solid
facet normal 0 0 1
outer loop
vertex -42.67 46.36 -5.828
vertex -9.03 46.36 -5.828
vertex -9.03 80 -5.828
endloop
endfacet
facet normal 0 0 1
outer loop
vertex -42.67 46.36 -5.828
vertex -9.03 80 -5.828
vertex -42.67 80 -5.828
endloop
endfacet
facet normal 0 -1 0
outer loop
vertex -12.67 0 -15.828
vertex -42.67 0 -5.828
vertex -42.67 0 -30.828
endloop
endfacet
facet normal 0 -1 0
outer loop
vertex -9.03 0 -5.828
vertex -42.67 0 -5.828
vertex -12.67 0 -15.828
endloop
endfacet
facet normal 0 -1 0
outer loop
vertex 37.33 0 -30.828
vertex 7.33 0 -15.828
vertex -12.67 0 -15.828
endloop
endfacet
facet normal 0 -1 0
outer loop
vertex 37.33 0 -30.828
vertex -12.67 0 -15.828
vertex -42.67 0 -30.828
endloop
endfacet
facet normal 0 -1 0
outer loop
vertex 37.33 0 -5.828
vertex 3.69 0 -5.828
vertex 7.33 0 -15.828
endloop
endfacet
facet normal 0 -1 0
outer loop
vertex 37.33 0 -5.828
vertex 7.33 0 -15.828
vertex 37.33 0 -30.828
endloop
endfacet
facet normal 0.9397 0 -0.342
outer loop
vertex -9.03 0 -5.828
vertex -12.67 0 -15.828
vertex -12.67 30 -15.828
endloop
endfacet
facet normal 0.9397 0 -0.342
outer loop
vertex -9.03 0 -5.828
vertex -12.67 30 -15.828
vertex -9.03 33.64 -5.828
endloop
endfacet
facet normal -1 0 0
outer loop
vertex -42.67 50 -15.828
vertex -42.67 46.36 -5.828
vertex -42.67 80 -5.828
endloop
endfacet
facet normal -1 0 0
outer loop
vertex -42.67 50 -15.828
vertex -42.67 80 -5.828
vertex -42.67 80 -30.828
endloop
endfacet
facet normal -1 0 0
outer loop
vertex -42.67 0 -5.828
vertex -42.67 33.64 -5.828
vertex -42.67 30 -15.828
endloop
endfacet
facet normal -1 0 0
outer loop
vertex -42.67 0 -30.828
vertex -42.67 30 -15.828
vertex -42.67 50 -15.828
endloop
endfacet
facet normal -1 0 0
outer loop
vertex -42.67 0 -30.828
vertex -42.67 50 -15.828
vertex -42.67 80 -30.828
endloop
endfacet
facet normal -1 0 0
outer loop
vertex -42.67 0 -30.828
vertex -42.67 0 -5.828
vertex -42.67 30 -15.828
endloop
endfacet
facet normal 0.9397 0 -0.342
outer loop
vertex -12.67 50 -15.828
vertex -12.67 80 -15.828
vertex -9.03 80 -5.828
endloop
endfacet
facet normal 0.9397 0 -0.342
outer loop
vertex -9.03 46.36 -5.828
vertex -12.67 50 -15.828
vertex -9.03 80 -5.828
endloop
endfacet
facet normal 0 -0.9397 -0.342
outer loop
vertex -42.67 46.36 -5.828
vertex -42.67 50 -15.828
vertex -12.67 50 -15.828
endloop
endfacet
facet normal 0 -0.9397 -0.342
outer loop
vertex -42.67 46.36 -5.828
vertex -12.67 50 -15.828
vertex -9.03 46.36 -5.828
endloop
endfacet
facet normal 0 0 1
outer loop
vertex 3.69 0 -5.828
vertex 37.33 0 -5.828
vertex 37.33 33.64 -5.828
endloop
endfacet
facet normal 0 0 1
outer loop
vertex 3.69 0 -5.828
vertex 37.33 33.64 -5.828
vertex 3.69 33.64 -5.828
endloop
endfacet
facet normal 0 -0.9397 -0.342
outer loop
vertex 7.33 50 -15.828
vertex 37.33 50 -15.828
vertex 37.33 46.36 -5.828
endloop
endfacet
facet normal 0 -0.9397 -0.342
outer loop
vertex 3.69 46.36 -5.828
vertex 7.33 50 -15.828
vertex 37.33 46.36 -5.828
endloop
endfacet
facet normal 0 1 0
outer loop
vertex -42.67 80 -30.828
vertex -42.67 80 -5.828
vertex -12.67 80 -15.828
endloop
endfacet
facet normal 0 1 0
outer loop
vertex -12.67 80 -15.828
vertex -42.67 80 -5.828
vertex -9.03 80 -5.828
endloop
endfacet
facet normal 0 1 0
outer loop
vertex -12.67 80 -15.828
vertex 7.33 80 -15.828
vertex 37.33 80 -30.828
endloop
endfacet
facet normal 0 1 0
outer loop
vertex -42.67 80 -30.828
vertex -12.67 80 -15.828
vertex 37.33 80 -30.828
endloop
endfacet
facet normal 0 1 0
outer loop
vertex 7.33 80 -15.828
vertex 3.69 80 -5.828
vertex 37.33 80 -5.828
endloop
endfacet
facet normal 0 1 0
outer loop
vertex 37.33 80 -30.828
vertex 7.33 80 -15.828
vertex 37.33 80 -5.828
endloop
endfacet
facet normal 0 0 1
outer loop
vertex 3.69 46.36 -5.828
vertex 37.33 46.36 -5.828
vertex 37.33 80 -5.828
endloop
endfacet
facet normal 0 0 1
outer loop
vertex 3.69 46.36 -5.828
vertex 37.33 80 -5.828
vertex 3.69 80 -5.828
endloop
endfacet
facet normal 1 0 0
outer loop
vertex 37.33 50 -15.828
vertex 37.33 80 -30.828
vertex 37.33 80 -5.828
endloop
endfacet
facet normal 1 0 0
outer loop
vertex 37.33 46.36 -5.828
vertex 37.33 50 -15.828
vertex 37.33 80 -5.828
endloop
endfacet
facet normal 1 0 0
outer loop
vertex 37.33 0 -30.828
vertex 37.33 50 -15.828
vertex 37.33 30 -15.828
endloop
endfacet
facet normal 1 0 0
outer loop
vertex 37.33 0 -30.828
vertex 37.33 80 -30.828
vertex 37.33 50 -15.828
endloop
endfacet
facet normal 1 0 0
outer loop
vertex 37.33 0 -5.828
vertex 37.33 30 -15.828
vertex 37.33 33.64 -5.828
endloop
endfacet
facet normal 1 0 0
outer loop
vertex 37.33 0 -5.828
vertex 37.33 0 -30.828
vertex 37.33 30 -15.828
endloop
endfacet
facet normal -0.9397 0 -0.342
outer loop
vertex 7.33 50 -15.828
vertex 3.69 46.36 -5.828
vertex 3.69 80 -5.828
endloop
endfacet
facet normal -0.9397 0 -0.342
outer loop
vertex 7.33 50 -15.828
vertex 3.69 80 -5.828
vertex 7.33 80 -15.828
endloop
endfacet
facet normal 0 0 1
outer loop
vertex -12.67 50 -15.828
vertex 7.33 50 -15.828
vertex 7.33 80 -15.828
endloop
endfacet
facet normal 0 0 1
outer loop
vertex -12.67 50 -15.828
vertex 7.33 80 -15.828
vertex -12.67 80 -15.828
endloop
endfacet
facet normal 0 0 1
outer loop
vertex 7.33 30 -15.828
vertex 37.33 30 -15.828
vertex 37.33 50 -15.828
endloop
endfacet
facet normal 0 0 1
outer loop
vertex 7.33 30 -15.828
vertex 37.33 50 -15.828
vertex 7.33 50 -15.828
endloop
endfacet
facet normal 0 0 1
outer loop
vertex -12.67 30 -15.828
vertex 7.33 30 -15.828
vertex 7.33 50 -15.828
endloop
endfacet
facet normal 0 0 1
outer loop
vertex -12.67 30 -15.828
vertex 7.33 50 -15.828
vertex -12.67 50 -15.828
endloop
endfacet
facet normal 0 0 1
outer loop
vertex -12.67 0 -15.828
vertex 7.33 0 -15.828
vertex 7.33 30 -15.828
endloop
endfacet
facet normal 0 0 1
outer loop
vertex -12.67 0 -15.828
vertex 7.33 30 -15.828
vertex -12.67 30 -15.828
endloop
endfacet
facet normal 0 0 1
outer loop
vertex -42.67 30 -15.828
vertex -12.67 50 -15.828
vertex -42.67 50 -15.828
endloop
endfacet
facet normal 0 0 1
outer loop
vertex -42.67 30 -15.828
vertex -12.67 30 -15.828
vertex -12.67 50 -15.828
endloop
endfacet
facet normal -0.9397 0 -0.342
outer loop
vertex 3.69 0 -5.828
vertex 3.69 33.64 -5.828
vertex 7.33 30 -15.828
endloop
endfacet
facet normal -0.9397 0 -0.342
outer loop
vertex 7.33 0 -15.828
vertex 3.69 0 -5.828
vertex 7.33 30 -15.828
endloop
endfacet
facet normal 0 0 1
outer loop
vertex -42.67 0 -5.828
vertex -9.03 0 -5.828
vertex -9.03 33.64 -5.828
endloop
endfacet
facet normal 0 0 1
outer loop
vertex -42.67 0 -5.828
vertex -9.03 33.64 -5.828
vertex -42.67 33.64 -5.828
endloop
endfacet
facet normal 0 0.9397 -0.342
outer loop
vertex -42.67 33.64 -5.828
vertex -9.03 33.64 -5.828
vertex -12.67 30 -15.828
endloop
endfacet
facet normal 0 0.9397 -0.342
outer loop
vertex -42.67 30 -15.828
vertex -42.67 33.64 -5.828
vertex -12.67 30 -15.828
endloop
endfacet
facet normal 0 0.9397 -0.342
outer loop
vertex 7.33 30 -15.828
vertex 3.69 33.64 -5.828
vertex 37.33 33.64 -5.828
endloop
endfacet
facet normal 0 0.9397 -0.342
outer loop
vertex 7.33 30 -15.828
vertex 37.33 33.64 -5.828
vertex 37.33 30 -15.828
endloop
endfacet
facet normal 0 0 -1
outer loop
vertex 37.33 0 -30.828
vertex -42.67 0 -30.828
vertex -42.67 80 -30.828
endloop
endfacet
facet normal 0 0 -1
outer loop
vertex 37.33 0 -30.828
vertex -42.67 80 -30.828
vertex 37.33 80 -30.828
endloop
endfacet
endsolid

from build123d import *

# Parameters (mm, degrees)
F1_DEPTH = 80
F3_DEPTH = 80


with BuildPart() as f1:
    # F0 (on Front) → F1 (new body)
    with BuildSketch(Plane.XZ):
        Polygon((37.330411, -5.82836), (3.690411, -5.82836), (7.330411, -15.82836), (-12.669589, -15.82836), (-9.029589, -5.82836), (-42.669589, -5.82836), (-42.669589, -30.82836), (37.330411, -30.82836), align=None)
    extrude(amount=-F1_DEPTH)

    # F2 (on face) → F3 (cut)
    with BuildSketch(Plane.YZ.offset(37.330411)):
        Polygon((30, -15.82836), (50, -15.82836), (46.36, -5.82836), (40, -5.82836), (33.64, -5.82836), align=None)
    extrude(amount=-F3_DEPTH, mode=Mode.SUBTRACT)


solid = f1.part
